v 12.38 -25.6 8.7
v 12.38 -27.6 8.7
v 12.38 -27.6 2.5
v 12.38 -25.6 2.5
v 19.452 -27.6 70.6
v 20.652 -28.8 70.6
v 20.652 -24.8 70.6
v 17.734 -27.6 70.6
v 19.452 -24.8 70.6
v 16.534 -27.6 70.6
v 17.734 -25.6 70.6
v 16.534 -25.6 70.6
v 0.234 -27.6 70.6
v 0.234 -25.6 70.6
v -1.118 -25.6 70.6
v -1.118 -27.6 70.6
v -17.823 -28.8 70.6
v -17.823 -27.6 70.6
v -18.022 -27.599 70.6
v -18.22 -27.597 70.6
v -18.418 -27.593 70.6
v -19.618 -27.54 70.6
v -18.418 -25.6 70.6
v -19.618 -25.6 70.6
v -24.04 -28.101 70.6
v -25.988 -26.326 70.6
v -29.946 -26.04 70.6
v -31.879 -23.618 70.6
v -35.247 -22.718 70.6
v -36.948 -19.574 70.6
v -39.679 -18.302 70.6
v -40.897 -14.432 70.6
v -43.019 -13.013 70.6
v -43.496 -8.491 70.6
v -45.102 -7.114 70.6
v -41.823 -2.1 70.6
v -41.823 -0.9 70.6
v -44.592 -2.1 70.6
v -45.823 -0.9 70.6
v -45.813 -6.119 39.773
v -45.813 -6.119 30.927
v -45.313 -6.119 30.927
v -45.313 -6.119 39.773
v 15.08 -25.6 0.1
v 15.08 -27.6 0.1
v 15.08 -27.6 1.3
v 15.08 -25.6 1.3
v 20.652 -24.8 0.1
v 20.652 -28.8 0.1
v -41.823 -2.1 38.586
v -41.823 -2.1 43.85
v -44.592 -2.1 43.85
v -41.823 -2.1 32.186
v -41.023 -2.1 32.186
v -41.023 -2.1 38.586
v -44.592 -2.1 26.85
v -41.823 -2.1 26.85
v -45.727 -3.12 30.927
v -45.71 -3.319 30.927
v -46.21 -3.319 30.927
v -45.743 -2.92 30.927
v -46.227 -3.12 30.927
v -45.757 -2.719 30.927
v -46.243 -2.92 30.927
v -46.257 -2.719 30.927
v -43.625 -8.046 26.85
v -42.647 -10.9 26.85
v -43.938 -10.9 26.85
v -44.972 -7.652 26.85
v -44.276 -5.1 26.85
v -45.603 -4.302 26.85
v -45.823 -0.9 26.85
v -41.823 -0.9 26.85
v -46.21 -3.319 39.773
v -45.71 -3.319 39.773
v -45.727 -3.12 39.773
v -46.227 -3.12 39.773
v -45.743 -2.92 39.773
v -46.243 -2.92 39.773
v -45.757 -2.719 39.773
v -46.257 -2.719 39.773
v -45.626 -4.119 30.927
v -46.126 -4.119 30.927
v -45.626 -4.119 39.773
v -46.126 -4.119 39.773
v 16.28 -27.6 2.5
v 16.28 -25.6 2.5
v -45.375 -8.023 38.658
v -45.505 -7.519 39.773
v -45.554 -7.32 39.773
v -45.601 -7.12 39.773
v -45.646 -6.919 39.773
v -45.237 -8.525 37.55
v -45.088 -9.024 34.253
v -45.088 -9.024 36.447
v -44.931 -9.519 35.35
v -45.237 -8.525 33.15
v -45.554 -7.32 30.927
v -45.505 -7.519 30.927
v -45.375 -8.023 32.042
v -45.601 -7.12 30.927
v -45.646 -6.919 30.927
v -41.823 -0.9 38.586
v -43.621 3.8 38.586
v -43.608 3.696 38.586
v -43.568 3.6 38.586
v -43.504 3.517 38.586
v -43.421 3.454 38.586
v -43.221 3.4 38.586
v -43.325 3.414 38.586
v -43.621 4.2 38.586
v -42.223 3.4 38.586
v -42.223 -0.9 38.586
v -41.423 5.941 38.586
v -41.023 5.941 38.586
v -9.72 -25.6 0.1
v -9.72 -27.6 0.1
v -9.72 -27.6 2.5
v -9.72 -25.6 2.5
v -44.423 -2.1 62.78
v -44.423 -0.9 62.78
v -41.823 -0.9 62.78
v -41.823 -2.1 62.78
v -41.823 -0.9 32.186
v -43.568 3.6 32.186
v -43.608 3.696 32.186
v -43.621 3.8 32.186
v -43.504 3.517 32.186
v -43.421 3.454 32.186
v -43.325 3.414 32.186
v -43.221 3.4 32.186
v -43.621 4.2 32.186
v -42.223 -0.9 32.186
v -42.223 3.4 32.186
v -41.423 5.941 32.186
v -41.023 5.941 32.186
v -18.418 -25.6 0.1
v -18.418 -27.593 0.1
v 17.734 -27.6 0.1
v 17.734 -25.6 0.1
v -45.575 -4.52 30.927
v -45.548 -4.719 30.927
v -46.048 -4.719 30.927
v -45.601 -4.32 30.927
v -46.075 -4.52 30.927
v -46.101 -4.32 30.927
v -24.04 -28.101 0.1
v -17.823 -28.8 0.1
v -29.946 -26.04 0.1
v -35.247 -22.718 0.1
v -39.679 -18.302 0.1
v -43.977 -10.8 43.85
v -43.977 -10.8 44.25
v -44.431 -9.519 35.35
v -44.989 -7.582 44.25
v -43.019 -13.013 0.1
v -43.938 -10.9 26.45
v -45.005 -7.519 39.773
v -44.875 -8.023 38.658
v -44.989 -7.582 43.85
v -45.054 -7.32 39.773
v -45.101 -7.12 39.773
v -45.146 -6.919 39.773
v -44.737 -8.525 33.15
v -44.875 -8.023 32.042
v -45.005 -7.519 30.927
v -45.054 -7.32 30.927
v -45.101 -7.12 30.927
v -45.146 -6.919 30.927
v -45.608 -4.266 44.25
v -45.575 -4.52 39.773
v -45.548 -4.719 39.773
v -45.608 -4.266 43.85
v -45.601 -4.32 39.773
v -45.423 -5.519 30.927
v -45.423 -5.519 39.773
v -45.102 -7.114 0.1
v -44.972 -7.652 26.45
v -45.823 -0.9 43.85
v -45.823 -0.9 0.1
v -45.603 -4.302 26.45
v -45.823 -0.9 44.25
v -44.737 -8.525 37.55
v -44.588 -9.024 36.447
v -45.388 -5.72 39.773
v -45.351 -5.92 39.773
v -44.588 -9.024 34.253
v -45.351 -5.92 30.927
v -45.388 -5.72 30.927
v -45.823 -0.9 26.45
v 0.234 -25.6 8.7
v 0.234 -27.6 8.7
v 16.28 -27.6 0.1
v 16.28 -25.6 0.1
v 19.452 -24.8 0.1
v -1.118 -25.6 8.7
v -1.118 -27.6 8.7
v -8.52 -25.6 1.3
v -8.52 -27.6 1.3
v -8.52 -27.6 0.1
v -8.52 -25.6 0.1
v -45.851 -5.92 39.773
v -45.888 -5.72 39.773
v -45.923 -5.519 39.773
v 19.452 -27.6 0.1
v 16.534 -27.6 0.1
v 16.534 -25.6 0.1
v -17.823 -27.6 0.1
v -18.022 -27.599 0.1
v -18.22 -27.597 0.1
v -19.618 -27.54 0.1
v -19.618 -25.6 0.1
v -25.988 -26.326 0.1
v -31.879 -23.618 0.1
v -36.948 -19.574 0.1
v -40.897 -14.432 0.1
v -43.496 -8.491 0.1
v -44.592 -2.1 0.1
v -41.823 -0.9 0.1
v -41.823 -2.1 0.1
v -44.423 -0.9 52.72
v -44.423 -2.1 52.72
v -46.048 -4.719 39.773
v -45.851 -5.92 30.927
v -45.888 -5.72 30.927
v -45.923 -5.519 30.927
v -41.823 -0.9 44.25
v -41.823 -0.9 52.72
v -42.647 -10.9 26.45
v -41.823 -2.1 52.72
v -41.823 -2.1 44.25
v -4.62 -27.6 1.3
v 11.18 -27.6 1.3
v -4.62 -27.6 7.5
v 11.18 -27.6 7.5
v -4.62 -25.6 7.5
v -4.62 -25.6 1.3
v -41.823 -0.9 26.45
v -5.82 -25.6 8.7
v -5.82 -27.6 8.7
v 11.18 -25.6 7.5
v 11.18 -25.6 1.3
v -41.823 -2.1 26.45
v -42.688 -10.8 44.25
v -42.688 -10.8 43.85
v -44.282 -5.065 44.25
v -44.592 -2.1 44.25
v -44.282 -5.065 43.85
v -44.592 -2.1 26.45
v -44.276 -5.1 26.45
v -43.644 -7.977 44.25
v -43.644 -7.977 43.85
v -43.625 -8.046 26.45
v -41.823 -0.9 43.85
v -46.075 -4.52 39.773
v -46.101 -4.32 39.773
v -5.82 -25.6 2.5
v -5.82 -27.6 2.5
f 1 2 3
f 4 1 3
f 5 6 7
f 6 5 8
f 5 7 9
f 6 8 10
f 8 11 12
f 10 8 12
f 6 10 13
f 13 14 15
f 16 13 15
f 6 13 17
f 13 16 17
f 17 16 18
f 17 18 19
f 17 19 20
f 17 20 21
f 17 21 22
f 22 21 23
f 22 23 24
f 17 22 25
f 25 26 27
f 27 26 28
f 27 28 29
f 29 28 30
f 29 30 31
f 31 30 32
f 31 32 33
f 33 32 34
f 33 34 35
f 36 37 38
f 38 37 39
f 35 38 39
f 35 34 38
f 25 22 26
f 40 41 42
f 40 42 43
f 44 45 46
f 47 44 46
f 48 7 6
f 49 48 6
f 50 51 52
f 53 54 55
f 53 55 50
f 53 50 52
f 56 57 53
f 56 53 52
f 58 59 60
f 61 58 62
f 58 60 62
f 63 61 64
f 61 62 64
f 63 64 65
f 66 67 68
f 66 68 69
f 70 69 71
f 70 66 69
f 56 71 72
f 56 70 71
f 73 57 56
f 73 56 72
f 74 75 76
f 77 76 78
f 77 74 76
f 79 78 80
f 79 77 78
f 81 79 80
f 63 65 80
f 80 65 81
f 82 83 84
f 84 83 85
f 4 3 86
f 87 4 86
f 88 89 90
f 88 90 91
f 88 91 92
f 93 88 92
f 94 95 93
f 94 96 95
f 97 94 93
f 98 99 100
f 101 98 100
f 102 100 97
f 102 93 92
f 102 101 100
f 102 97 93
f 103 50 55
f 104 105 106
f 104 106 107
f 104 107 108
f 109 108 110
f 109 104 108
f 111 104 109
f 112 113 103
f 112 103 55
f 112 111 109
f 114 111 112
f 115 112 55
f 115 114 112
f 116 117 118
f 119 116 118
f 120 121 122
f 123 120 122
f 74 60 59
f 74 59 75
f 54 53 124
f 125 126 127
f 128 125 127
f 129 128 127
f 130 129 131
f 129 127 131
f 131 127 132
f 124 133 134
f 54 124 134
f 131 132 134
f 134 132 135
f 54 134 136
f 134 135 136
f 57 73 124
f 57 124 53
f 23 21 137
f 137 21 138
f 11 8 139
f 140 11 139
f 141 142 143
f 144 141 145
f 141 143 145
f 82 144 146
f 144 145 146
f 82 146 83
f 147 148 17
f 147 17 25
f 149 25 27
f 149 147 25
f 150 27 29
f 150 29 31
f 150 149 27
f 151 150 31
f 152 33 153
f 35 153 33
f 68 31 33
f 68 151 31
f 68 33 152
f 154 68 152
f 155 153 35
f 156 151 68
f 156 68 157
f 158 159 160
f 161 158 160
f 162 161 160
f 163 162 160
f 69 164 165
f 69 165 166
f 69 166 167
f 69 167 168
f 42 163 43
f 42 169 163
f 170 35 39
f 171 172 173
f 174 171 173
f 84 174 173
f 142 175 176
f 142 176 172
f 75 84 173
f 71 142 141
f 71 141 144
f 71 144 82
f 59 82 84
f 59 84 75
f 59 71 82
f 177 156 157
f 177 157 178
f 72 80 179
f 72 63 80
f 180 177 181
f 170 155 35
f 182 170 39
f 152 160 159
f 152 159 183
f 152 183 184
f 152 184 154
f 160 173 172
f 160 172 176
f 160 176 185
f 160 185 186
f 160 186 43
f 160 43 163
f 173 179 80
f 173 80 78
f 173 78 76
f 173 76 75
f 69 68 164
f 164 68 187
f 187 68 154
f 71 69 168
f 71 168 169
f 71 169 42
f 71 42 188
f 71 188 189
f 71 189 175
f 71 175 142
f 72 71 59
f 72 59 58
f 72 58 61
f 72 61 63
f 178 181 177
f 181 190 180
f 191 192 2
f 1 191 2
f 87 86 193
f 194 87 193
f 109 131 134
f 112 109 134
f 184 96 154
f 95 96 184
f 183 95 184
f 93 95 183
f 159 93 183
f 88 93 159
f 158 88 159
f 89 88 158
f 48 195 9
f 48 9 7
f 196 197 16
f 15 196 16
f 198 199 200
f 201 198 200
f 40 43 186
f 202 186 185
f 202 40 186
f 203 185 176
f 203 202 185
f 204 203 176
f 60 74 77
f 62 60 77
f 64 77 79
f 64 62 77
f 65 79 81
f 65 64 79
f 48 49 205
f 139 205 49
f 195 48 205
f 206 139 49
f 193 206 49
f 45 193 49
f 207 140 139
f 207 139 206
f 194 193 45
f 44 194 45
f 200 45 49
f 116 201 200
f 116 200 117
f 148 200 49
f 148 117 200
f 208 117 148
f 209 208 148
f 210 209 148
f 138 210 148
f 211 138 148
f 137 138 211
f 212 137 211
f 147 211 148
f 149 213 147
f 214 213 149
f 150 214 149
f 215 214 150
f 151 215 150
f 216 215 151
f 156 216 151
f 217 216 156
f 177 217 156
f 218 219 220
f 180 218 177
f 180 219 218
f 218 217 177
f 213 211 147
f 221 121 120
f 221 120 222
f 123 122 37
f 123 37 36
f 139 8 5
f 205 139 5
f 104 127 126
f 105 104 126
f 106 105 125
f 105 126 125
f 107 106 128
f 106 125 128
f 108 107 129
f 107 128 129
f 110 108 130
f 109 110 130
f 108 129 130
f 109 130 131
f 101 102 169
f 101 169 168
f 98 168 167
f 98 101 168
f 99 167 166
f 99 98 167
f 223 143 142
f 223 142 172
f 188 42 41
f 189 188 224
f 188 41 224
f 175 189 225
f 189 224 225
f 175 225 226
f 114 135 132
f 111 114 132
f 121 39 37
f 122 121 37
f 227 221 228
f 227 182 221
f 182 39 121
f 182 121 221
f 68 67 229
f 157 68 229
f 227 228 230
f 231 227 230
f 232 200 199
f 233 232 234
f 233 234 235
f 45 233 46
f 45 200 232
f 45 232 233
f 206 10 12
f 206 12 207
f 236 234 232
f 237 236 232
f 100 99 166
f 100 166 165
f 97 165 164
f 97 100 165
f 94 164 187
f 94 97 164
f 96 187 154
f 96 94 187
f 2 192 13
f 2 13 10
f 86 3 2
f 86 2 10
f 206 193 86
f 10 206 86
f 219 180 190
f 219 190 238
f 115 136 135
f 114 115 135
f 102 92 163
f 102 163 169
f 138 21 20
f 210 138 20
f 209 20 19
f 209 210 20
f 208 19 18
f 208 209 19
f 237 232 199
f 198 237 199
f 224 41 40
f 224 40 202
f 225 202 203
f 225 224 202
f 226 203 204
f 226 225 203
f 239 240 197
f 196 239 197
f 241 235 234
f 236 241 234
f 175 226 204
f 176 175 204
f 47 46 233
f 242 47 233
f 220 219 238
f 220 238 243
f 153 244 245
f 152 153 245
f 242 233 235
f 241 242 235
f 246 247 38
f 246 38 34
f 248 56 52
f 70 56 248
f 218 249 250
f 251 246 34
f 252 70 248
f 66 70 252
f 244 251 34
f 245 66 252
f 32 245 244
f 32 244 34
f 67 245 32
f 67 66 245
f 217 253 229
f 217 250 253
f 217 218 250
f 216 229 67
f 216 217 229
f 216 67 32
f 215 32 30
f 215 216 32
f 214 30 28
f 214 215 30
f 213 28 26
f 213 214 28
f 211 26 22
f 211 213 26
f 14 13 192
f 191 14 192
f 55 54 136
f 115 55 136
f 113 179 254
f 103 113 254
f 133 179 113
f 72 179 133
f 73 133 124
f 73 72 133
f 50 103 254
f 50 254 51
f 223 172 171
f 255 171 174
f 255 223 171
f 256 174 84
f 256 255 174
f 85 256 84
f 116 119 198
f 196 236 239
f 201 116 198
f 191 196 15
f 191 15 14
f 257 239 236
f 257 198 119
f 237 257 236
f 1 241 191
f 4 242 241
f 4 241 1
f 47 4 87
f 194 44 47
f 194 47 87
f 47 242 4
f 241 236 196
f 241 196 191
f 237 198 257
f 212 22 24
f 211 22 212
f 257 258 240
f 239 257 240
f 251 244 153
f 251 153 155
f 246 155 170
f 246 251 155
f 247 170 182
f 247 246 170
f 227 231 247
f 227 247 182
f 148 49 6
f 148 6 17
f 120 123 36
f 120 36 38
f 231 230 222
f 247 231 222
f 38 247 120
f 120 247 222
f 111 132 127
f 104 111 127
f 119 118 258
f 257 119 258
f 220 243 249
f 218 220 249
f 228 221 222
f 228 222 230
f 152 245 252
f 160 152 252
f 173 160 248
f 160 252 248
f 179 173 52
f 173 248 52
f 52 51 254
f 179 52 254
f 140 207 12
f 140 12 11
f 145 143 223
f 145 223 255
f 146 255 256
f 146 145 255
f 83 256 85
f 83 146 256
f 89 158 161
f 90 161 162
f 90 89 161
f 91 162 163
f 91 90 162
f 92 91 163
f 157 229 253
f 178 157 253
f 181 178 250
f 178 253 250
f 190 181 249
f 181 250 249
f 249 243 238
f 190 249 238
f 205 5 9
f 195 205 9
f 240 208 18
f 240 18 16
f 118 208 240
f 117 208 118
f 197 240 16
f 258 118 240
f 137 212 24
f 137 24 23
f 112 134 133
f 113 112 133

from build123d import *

# Parameters (mm, degrees)
EXTRUDE_START          = 0.1
EXTRUDE_1_DEPTH        = 70.5
SKETCH_3_W             = 0.4
SKETCH_3_H             = 10
CUT_EXTRUDE_1_DEPTH    = 89.958131389
EXTRUDE_START_2        = 0.3
EXTRUDE_2_DEPTH        = 6.4
EXTRUDE_3_REACH        = 103.657
EXTRUDE_3_START_RADIUS = 28
EXTRUDE_3_END_RADIUS   = 28
SKETCH_5_W             = 8.845499788
SKETCH_5_H             = 0.6
SKETCH_6_W             = 1.2
SKETCH_6_H             = 70.5
EXTRUDE_4_DEPTH        = 2
SKETCH_7_W             = 7.03
SKETCH_7_H             = 10.06
CUT_EXTRUDE_2_DEPTH    = 2


# Read off the part's stored shape, not the designer's step: Бобышка-Вытянуть2
with BuildPart() as part:
    # Эскиз1 → Бобышка-Вытянуть1 (new body)
    with BuildSketch(Plane.XY.offset(EXTRUDE_START)):
        with BuildLine():
            Line((20.652219826, -28.8), (-17.823198335, -28.8))
            ThreePointArc((-17.823198335, -28.8), (-37.586801245, -20.634313701), (-45.823019763, -0.9))
            Line((-45.823019763, -0.9), (-41.823019763, -0.9))
            Line((-41.823019763, -0.9), (-41.823019763, -2.1))
            Line((-41.823019763, -2.1), (-44.591649915, -2.1))
            ThreePointArc((-44.591649915, -2.1), (-36.308327493, -20.204638621), (-17.823198335, -27.6))
            Line((-17.823198335, -27.6), (19.452219826, -27.6))
            Line((19.452219826, -27.6), (19.452219826, -24.8))
            Line((19.452219826, -24.8), (20.652219826, -24.8))
            Line((20.652219826, -24.8), (20.652219826, -28.8))
        make_face()
    extrude(amount=EXTRUDE_1_DEPTH)

    # Эскиз3 → Вырез-Вытянуть1 (cut, through all)
    with BuildSketch(Plane(origin=(0, 0, 0), x_dir=(0, 0, -1), z_dir=(1, 0, 0))):
        with Locations((-44.05, -5.8)):
            Rectangle(SKETCH_3_W, SKETCH_3_H)
        with Locations((-26.65, -5.9)):
            Rectangle(SKETCH_3_W, SKETCH_3_H)
    extrude(amount=-CUT_EXTRUDE_1_DEPTH, mode=Mode.SUBTRACT)

    # Бобышка-Вытянуть2 outline → Бобышка-Вытянуть2 (add)
    with BuildSketch(Plane.XY.offset(31.886146776).offset(EXTRUDE_START_2)):
        with BuildLine():
            Line((-41.823019763, -2.1), (-41.023198335, -2.1))
            Line((-41.023198335, -2.1), (-41.023198335, 5.941310574))
            Line((-41.023198335, 5.941310574), (-41.423198335, 5.941310574))
            Line((-41.423198335, 5.941310574), (-43.62142157, 4.2))
            Line((-43.62142157, 4.2), (-43.62142157, 3.8))
            ThreePointArc((-43.62142157, 3.8), (-43.504264282, 3.517157288), (-43.22142157, 3.4))
            Line((-43.22142157, 3.4), (-42.223198335, 3.4))
            Line((-42.223198335, 3.4), (-42.223198335, -0.9))
            Line((-42.223198335, -0.9), (-41.823019763, -0.9))
            Line((-41.823019763, -0.9), (-41.823019763, -2.1))
        make_face()
    extrude(amount=EXTRUDE_2_DEPTH)

    # Бобышка-Вытянуть3: from a cylinder face, 103.657 long prism both ways, kept between that surface and its translate by the depth
    extrude_3_start = Plane(origin=(-17.823198335, -0.8, 35.35), z_dir=(0, 0, -1)) * Cylinder(EXTRUDE_3_START_RADIUS, 264.314, mode=Mode.PRIVATE)
    extrude_3_end = Plane(origin=(-18.323198335, -0.8, 35.35), z_dir=(0, 0, -1)) * Cylinder(EXTRUDE_3_END_RADIUS, 264.314, mode=Mode.PRIVATE)
    # Эскиз5 → Бобышка-Вытянуть3 (add, from a surface)
    with BuildSketch(Plane.ZY.offset(45.823198335), mode=Mode.PRIVATE) as extrude_3_sk1:
        with Locations((35.35, -3.019441342)):
            Rectangle(SKETCH_5_W, SKETCH_5_H)
    extrude_3_tool1 = extrude(extrude_3_sk1.sketch, amount=EXTRUDE_3_REACH, both=True, mode=Mode.PRIVATE)
    add(((extrude_3_tool1 - extrude_3_start) & extrude_3_end).solids().sort_by_distance((-45.34413, -3.019441, 35.35))[0])
    # Эскиз5 → Бобышка-Вытянуть3 (add, from a surface)
    with BuildSketch(Plane.ZY.offset(45.823198335), mode=Mode.PRIVATE) as extrude_3_sk2:
        with Locations((35.35, -4.419441342)):
            Rectangle(SKETCH_5_W, SKETCH_5_H)
    extrude_3_tool2 = extrude(extrude_3_sk2.sketch, amount=EXTRUDE_3_REACH, both=True, mode=Mode.PRIVATE)
    add(((extrude_3_tool2 - extrude_3_start) & extrude_3_end).solids().sort_by_distance((-45.34413, -3.019441, 35.35))[0])
    # Эскиз5 → Бобышка-Вытянуть3 (add, from a surface)
    with BuildSketch(Plane.ZY.offset(45.823198335), mode=Mode.PRIVATE) as extrude_3_sk3:
        with Locations((35.35, -5.819441342)):
            Rectangle(SKETCH_5_W, SKETCH_5_H)
    extrude_3_tool3 = extrude(extrude_3_sk3.sketch, amount=EXTRUDE_3_REACH, both=True, mode=Mode.PRIVATE)
    add(((extrude_3_tool3 - extrude_3_start) & extrude_3_end).solids().sort_by_distance((-45.34413, -3.019441, 35.35))[0])
    # Эскиз5 → Бобышка-Вытянуть3 (add, from a surface)
    with BuildSketch(Plane.ZY.offset(45.823198335), mode=Mode.PRIVATE) as extrude_3_sk4:
        Polygon((30.927250106, -7.519441342), (35.35, -9.519441342), (39.772749894, -7.519441342), (39.772749894, -6.919441342), (30.927250106, -6.919441342), align=None)
    extrude_3_tool4 = extrude(extrude_3_sk4.sketch, amount=EXTRUDE_3_REACH, both=True, mode=Mode.PRIVATE)
    add(((extrude_3_tool4 - extrude_3_start) & extrude_3_end).solids().sort_by_distance((-45.34413, -3.019441, 35.35))[0])

    # Эскиз6 → Бобышка-Вытянуть4 (add)
    with BuildSketch(Plane(origin=(0, -27.6, 0), x_dir=(1, 0, 0), z_dir=(0, 1, 0))):
        with Locations((-19.018158387, -35.35)):
            Rectangle(SKETCH_6_W, SKETCH_6_H)
        with Locations((17.134396076, -35.35)):
            Rectangle(SKETCH_6_W, SKETCH_6_H)
        Polygon((0.234396076, -8.7), (12.380116687, -8.7), (12.380116687, -2.5), (16.280116687, -2.5), (16.280116687, -0.1), (15.080116687, -0.1), (15.080116687, -1.3), (11.180116687, -1.3), (11.180116687, -7.5), (-4.619883313, -7.5), (-4.619883313, -1.3), (-8.519883313, -1.3), (-8.519883313, -0.1), (-9.719883313, -0.1), (-9.719883313, -2.5), (-5.819883313, -2.5), (-5.819883313, -8.7), (-1.118158387, -8.7), (-1.118158387, -70.6), (0.234396076, -70.6), align=None)
    extrude(amount=EXTRUDE_4_DEPTH)

    # Эскиз7 → Вырез-Вытянуть2 (cut)
    with BuildSketch(Plane(origin=(0, -0.9, 0), x_dir=(1, 0, 0), z_dir=(0, 1, 0))):
        with Locations((-40.908198335, -57.75)):
            Rectangle(SKETCH_7_W, SKETCH_7_H)
    extrude(amount=-CUT_EXTRUDE_2_DEPTH, mode=Mode.SUBTRACT)


solid = part.part
